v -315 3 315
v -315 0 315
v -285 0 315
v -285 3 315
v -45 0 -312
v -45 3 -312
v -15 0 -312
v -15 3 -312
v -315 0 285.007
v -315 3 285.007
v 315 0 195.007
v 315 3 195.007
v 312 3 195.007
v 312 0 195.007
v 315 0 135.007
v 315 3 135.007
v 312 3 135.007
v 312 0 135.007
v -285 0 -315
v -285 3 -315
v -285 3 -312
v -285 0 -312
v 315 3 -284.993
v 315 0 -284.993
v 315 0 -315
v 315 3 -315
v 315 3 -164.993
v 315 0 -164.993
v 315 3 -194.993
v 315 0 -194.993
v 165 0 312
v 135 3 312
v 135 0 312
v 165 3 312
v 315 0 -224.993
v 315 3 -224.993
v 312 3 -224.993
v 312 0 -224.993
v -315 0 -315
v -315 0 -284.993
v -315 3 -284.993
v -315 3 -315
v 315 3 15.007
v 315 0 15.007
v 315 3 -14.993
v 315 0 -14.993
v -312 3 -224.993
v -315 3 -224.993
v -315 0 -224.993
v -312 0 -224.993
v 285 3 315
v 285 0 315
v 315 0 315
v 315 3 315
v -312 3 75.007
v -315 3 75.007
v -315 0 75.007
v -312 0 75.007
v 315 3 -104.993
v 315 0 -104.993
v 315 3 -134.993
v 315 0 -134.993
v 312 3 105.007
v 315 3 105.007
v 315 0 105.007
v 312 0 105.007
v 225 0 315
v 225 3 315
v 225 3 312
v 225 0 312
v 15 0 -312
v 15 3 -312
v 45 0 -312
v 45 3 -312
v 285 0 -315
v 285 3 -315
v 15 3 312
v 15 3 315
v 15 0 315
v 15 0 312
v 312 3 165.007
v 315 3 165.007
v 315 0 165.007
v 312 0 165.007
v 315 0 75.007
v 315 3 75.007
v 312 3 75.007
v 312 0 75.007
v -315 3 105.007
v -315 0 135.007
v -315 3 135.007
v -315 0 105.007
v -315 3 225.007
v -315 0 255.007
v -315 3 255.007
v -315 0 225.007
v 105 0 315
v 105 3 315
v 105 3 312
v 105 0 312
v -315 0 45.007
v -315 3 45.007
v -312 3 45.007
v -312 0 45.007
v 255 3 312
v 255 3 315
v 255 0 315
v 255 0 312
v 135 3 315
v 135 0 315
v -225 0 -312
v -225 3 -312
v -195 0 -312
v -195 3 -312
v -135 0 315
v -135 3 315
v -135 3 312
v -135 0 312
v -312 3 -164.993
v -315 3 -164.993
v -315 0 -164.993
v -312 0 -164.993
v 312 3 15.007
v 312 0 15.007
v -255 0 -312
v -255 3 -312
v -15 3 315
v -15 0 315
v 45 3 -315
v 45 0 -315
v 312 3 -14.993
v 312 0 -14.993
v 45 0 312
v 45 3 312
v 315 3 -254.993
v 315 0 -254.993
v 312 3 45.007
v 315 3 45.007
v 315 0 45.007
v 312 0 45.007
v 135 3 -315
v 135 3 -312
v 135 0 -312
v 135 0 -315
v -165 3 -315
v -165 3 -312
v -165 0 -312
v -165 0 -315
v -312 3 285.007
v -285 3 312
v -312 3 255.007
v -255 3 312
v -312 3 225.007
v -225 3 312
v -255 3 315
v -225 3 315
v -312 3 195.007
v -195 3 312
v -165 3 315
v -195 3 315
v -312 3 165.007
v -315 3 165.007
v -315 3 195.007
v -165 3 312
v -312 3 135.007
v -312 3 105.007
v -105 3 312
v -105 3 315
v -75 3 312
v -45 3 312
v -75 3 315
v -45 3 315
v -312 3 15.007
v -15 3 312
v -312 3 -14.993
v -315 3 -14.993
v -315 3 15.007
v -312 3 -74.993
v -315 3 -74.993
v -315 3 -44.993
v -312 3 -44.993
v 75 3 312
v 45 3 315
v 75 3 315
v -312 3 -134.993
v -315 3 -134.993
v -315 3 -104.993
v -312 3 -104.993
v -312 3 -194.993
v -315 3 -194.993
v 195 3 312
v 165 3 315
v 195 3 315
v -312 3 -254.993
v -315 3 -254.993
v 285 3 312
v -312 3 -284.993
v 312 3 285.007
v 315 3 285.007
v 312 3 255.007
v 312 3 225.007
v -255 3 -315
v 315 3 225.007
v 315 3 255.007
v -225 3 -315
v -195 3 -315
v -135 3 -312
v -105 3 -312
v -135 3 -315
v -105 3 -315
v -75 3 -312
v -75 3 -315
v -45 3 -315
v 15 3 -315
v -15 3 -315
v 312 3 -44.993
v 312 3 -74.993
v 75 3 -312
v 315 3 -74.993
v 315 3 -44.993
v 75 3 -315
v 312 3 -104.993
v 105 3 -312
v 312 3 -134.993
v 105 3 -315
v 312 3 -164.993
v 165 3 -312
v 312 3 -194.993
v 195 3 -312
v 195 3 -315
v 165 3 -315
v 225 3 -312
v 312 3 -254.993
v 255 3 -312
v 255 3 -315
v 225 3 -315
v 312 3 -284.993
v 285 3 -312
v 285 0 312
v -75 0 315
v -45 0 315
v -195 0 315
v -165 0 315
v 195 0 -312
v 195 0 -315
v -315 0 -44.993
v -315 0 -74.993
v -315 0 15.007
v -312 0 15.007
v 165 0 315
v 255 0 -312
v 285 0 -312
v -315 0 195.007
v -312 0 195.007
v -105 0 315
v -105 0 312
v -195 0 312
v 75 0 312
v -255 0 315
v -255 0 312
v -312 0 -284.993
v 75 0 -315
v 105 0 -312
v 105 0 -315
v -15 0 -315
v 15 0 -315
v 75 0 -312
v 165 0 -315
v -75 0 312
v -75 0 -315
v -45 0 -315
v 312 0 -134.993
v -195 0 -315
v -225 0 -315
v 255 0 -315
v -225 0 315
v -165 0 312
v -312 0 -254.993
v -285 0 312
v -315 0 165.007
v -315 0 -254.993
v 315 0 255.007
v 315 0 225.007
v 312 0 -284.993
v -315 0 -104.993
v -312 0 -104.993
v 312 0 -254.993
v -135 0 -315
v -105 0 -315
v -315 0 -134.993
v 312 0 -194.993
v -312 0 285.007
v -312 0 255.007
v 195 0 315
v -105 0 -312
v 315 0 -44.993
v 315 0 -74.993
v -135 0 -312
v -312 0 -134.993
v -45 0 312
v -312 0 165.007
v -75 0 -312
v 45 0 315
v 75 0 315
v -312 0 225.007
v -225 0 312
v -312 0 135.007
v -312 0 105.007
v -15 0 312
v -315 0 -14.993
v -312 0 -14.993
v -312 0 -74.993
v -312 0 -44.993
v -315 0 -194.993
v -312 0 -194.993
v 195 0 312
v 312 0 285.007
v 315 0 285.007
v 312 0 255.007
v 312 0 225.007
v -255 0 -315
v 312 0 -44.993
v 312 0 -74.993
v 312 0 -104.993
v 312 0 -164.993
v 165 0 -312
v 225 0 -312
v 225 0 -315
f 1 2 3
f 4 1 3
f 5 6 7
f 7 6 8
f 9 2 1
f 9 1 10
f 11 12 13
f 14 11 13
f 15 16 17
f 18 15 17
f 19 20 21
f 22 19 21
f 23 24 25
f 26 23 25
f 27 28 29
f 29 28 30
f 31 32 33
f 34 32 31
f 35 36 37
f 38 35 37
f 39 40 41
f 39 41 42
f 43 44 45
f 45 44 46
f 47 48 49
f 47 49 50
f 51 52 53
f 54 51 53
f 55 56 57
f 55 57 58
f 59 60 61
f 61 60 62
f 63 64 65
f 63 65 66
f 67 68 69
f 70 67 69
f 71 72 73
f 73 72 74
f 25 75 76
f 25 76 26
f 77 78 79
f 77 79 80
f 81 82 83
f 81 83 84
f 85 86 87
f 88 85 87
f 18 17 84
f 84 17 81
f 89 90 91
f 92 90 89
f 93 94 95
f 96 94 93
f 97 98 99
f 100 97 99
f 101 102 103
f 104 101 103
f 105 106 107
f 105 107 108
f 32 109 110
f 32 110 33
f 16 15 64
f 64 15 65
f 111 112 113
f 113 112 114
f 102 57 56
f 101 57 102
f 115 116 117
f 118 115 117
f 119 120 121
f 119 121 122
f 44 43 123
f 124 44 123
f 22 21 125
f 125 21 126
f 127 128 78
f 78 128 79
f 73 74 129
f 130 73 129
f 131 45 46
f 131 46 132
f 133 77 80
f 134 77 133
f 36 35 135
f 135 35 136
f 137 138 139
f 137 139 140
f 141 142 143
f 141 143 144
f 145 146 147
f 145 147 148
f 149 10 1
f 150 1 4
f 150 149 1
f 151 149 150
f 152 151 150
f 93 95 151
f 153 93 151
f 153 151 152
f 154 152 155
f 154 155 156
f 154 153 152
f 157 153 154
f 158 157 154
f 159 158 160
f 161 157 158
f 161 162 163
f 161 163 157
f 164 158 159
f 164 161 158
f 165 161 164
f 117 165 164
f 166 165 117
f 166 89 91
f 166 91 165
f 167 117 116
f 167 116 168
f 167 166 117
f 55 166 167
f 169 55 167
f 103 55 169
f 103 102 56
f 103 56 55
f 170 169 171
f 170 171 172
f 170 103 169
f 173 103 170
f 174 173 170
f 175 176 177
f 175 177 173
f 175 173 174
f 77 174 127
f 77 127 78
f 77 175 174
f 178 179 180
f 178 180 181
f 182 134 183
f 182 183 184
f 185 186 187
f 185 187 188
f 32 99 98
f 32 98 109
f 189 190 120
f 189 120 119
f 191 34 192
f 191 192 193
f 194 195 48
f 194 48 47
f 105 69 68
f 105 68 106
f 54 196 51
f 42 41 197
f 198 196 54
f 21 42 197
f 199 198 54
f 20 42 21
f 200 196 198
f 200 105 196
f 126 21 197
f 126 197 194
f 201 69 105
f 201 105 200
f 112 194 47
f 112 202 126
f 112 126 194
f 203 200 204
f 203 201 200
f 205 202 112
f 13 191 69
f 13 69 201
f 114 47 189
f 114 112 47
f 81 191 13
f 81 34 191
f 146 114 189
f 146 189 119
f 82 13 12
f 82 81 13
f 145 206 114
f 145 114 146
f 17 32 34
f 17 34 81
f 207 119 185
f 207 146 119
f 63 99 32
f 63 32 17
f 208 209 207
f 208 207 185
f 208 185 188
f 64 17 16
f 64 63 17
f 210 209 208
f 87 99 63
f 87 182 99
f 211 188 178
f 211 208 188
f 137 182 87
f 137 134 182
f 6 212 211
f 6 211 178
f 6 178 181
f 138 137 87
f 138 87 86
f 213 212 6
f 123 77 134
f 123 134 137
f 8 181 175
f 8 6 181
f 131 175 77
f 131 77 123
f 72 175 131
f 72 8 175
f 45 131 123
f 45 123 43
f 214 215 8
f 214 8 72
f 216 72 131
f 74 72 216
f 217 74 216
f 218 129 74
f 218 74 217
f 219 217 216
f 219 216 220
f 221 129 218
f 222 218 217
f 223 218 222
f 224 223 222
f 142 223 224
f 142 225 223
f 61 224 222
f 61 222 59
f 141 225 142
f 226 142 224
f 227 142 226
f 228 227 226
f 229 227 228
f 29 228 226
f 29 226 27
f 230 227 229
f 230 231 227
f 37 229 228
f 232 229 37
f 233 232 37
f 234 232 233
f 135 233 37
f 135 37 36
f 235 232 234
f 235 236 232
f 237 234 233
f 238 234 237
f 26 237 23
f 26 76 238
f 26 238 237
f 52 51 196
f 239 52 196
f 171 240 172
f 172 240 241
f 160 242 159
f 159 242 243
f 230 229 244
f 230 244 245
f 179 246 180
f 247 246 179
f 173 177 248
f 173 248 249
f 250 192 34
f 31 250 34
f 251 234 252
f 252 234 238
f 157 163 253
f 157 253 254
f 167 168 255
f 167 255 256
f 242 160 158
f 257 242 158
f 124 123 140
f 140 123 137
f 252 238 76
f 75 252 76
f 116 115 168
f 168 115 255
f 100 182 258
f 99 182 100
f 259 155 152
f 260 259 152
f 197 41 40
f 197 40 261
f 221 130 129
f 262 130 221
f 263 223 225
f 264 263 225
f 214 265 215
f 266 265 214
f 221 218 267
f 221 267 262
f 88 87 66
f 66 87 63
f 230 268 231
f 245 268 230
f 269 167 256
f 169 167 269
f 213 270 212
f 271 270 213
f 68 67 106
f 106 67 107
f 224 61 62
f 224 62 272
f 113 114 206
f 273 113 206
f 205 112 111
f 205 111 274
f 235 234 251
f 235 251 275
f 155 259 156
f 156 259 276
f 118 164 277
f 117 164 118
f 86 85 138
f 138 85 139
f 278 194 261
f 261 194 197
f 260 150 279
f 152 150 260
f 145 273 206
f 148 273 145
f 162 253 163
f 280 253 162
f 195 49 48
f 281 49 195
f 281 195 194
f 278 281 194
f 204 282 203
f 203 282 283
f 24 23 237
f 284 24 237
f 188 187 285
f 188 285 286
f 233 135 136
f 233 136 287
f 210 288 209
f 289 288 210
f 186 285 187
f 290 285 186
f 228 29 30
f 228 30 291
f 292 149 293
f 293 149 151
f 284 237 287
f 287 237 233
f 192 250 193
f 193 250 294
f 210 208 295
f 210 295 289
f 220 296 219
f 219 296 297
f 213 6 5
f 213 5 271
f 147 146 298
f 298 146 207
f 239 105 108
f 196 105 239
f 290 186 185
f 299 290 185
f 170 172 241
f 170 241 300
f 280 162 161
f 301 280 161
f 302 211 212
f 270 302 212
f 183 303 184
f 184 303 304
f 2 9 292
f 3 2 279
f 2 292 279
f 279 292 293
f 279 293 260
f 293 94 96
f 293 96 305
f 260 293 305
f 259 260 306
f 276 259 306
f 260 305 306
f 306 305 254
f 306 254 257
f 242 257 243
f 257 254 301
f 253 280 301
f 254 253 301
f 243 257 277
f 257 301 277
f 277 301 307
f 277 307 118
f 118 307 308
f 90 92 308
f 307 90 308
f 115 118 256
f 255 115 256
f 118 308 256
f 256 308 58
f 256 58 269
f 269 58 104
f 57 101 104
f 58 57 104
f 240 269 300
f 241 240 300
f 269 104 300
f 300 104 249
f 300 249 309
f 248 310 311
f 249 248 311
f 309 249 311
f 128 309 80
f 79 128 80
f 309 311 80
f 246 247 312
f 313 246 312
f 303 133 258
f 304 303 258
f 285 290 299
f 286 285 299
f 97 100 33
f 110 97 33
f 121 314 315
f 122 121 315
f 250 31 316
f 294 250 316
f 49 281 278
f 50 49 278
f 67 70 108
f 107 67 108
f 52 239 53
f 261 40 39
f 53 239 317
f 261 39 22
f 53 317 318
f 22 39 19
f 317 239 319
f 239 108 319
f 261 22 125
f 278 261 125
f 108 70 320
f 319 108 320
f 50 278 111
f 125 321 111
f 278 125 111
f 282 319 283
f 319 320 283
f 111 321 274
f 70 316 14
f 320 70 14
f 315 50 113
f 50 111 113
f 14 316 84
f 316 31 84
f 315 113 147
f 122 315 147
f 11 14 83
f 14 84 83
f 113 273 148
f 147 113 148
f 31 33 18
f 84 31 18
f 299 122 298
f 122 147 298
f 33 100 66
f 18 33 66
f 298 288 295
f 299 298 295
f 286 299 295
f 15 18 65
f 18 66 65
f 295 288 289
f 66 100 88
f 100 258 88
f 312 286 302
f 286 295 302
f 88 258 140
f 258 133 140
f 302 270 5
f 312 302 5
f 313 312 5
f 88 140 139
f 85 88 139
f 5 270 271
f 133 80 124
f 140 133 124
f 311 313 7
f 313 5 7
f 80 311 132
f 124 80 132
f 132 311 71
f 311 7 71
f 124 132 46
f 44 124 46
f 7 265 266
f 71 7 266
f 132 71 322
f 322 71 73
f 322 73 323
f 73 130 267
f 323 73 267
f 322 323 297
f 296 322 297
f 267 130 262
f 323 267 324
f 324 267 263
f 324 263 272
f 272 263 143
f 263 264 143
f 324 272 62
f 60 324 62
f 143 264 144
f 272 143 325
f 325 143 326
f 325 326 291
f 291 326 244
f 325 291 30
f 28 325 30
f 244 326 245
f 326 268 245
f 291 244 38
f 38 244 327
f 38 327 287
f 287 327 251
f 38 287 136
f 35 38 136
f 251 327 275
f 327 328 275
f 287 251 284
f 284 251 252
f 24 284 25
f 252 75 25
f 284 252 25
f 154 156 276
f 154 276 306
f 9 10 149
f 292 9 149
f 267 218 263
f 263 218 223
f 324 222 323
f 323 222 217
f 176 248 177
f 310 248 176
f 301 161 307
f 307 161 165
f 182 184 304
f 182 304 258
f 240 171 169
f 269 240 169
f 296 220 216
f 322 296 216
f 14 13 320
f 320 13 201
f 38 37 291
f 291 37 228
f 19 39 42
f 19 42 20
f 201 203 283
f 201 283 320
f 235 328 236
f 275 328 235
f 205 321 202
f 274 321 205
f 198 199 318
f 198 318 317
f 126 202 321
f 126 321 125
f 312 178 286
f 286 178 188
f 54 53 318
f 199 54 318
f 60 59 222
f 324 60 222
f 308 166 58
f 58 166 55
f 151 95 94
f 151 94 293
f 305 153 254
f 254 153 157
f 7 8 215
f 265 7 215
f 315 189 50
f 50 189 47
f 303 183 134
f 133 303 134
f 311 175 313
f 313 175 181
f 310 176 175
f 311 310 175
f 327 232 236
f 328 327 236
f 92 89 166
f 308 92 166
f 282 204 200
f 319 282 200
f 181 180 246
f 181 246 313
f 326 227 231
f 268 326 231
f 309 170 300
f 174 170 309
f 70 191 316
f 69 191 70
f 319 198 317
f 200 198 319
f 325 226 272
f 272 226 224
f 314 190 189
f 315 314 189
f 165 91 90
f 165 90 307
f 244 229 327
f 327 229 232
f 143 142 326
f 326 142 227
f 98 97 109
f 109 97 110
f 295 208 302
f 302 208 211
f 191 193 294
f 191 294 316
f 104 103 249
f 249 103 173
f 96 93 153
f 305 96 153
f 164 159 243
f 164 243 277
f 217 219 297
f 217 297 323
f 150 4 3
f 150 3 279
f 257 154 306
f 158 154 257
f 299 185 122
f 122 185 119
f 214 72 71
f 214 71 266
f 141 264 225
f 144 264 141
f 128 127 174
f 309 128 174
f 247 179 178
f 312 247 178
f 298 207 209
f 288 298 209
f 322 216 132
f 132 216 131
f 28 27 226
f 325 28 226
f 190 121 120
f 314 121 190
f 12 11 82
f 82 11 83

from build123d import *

# Parameters (mm, degrees)
SKETCH1_W               = 630
SKETCH1_H               = 630
BOSS_EXTRUDE1_DEPTH     = 3
SKETCH3_W               = 3
SKETCH3_H               = 30
CUT_EXTRUDE2_DEPTH      = 3
LPATTERN2_COUNT         = 10
LPATTERN2_PITCH         = 60
MIRROR1_COPY_1_SKETCH_W = 3
MIRROR1_COPY_1_SKETCH_H = 30
MIRROR1_COPY_1_DEPTH    = 3
MIRROR1_COPY_2_SKETCH_W = 3
MIRROR1_COPY_2_SKETCH_H = 30
MIRROR1_COPY_2_DEPTH    = 3
MIRROR1_COPY_3_SKETCH_W = 3
MIRROR1_COPY_3_SKETCH_H = 30
MIRROR1_COPY_3_DEPTH    = 3
MIRROR1_COPY_4_SKETCH_W = 3
MIRROR1_COPY_4_SKETCH_H = 30
MIRROR1_COPY_4_DEPTH    = 3
MIRROR1_COPY_5_SKETCH_W = 3
MIRROR1_COPY_5_SKETCH_H = 30
MIRROR1_COPY_5_DEPTH    = 3
MIRROR1_COPY_6_SKETCH_W = 3
MIRROR1_COPY_6_SKETCH_H = 30
MIRROR1_COPY_6_DEPTH    = 3
MIRROR1_COPY_7_SKETCH_W = 3
MIRROR1_COPY_7_SKETCH_H = 30
MIRROR1_COPY_7_DEPTH    = 3
MIRROR1_COPY_8_SKETCH_W = 3
MIRROR1_COPY_8_SKETCH_H = 30
MIRROR1_COPY_8_DEPTH    = 3
MIRROR1_COPY_9_SKETCH_W = 3
MIRROR1_COPY_9_SKETCH_H = 30
MIRROR1_COPY_9_DEPTH    = 3
SKETCH5_W               = 30
SKETCH5_H               = 3
CUT_EXTRUDE3_DEPTH      = 3
LPATTERN3_COUNT         = 10
LPATTERN3_PITCH         = 60
MIRROR2_COPY_1_SKETCH_W = 30
MIRROR2_COPY_1_SKETCH_H = 3
MIRROR2_COPY_1_DEPTH    = 3
MIRROR2_COPY_2_SKETCH_W = 30
MIRROR2_COPY_2_SKETCH_H = 3
MIRROR2_COPY_2_DEPTH    = 3
MIRROR2_COPY_3_SKETCH_W = 30
MIRROR2_COPY_3_SKETCH_H = 3
MIRROR2_COPY_3_DEPTH    = 3
MIRROR2_COPY_4_SKETCH_W = 30
MIRROR2_COPY_4_SKETCH_H = 3
MIRROR2_COPY_4_DEPTH    = 3
MIRROR2_COPY_5_SKETCH_W = 30
MIRROR2_COPY_5_SKETCH_H = 3
MIRROR2_COPY_5_DEPTH    = 3
MIRROR2_COPY_6_SKETCH_W = 30
MIRROR2_COPY_6_SKETCH_H = 3
MIRROR2_COPY_6_DEPTH    = 3
MIRROR2_COPY_7_SKETCH_W = 30
MIRROR2_COPY_7_SKETCH_H = 3
MIRROR2_COPY_7_DEPTH    = 3
MIRROR2_COPY_8_SKETCH_W = 30
MIRROR2_COPY_8_SKETCH_H = 3
MIRROR2_COPY_8_DEPTH    = 3
MIRROR2_COPY_9_SKETCH_W = 30
MIRROR2_COPY_9_SKETCH_H = 3
MIRROR2_COPY_9_DEPTH    = 3


with BuildPart() as part:
    # Sketch1 → Boss-Extrude1 (new body)
    with BuildSketch(Plane(origin=(0, 0, 0), x_dir=(1, 0, 0), z_dir=(0, 1, 0))):
        Rectangle(SKETCH1_W, SKETCH1_H)
    extrude(amount=BOSS_EXTRUDE1_DEPTH)

    # Sketch3 → Cut-Extrude2 (cut)
    with BuildSketch(Plane(origin=(0, 3, 0), x_dir=(1, 0, 0), z_dir=(0, 1, 0))):
        with Locations((-313.5, -270.006843512)):
            Rectangle(SKETCH3_W, SKETCH3_H)
    cut_extrude2 = extrude(amount=-CUT_EXTRUDE2_DEPTH, mode=Mode.SUBTRACT)

    # LPattern2: Cut-Extrude2 ×10
    with Locations(*[(0, 0, -i * LPATTERN2_PITCH) for i in range(1, LPATTERN2_COUNT)]):
        add(cut_extrude2, mode=Mode.SUBTRACT)

    # Mirror1: Cut-Extrude2 across plane
    add(cut_extrude2.mirror(Plane(origin=(0, 0, 0), x_dir=(0, 0, 1), z_dir=(1, 0, 0))), mode=Mode.SUBTRACT)

    # Mirror1 copy 1 sketch → Mirror1 copy 1 (cut)
    with BuildSketch(Plane(origin=(0, 3, -60), x_dir=(-1, 0, 0), z_dir=(0, 1, 0))):
        with Locations((-313.5, 270.006843512)):
            Rectangle(MIRROR1_COPY_1_SKETCH_W, MIRROR1_COPY_1_SKETCH_H)
    extrude(amount=-MIRROR1_COPY_1_DEPTH, mode=Mode.SUBTRACT)

    # Mirror1 copy 2 sketch → Mirror1 copy 2 (cut)
    with BuildSketch(Plane(origin=(0, 3, -120), x_dir=(-1, 0, 0), z_dir=(0, 1, 0))):
        with Locations((-313.5, 270.006843512)):
            Rectangle(MIRROR1_COPY_2_SKETCH_W, MIRROR1_COPY_2_SKETCH_H)
    extrude(amount=-MIRROR1_COPY_2_DEPTH, mode=Mode.SUBTRACT)

    # Mirror1 copy 3 sketch → Mirror1 copy 3 (cut)
    with BuildSketch(Plane(origin=(0, 3, -180), x_dir=(-1, 0, 0), z_dir=(0, 1, 0))):
        with Locations((-313.5, 270.006843512)):
            Rectangle(MIRROR1_COPY_3_SKETCH_W, MIRROR1_COPY_3_SKETCH_H)
    extrude(amount=-MIRROR1_COPY_3_DEPTH, mode=Mode.SUBTRACT)

    # Mirror1 copy 4 sketch → Mirror1 copy 4 (cut)
    with BuildSketch(Plane(origin=(0, 3, -240), x_dir=(-1, 0, 0), z_dir=(0, 1, 0))):
        with Locations((-313.5, 270.006843512)):
            Rectangle(MIRROR1_COPY_4_SKETCH_W, MIRROR1_COPY_4_SKETCH_H)
    extrude(amount=-MIRROR1_COPY_4_DEPTH, mode=Mode.SUBTRACT)

    # Mirror1 copy 5 sketch → Mirror1 copy 5 (cut)
    with BuildSketch(Plane(origin=(0, 3, -300), x_dir=(-1, 0, 0), z_dir=(0, 1, 0))):
        with Locations((-313.5, 270.006843512)):
            Rectangle(MIRROR1_COPY_5_SKETCH_W, MIRROR1_COPY_5_SKETCH_H)
    extrude(amount=-MIRROR1_COPY_5_DEPTH, mode=Mode.SUBTRACT)

    # Mirror1 copy 6 sketch → Mirror1 copy 6 (cut)
    with BuildSketch(Plane(origin=(0, 3, -360), x_dir=(-1, 0, 0), z_dir=(0, 1, 0))):
        with Locations((-313.5, 270.006843512)):
            Rectangle(MIRROR1_COPY_6_SKETCH_W, MIRROR1_COPY_6_SKETCH_H)
    extrude(amount=-MIRROR1_COPY_6_DEPTH, mode=Mode.SUBTRACT)

    # Mirror1 copy 7 sketch → Mirror1 copy 7 (cut)
    with BuildSketch(Plane(origin=(0, 3, -420), x_dir=(-1, 0, 0), z_dir=(0, 1, 0))):
        with Locations((-313.5, 270.006843512)):
            Rectangle(MIRROR1_COPY_7_SKETCH_W, MIRROR1_COPY_7_SKETCH_H)
    extrude(amount=-MIRROR1_COPY_7_DEPTH, mode=Mode.SUBTRACT)

    # Mirror1 copy 8 sketch → Mirror1 copy 8 (cut)
    with BuildSketch(Plane(origin=(0, 3, -480), x_dir=(-1, 0, 0), z_dir=(0, 1, 0))):
        with Locations((-313.5, 270.006843512)):
            Rectangle(MIRROR1_COPY_8_SKETCH_W, MIRROR1_COPY_8_SKETCH_H)
    extrude(amount=-MIRROR1_COPY_8_DEPTH, mode=Mode.SUBTRACT)

    # Mirror1 copy 9 sketch → Mirror1 copy 9 (cut)
    with BuildSketch(Plane(origin=(0, 3, -540), x_dir=(-1, 0, 0), z_dir=(0, 1, 0))):
        with Locations((-313.5, 270.006843512)):
            Rectangle(MIRROR1_COPY_9_SKETCH_W, MIRROR1_COPY_9_SKETCH_H)
    extrude(amount=-MIRROR1_COPY_9_DEPTH, mode=Mode.SUBTRACT)

    # Sketch5 → Cut-Extrude3 (cut)
    with BuildSketch(Plane(origin=(0, 3, 0), x_dir=(1, 0, 0), z_dir=(0, 1, 0))):
        with Locations((-270.000314512, -313.5)):
            Rectangle(SKETCH5_W, SKETCH5_H)
    cut_extrude3 = extrude(amount=-CUT_EXTRUDE3_DEPTH, mode=Mode.SUBTRACT)

    # LPattern3: Cut-Extrude3 ×10
    with Locations(*[(i * LPATTERN3_PITCH, 0, 0) for i in range(1, LPATTERN3_COUNT)]):
        add(cut_extrude3, mode=Mode.SUBTRACT)

    # Mirror2: Cut-Extrude3 across plane
    add(cut_extrude3.mirror(Plane.XY), mode=Mode.SUBTRACT)

    # Mirror2 copy 1 sketch → Mirror2 copy 1 (cut)
    with BuildSketch(Plane(origin=(60, 3, 0), x_dir=(1, 0, 0), z_dir=(0, 1, 0))):
        with Locations((-270.000314512, 313.5)):
            Rectangle(MIRROR2_COPY_1_SKETCH_W, MIRROR2_COPY_1_SKETCH_H)
    extrude(amount=-MIRROR2_COPY_1_DEPTH, mode=Mode.SUBTRACT)

    # Mirror2 copy 2 sketch → Mirror2 copy 2 (cut)
    with BuildSketch(Plane(origin=(120, 3, 0), x_dir=(1, 0, 0), z_dir=(0, 1, 0))):
        with Locations((-270.000314512, 313.5)):
            Rectangle(MIRROR2_COPY_2_SKETCH_W, MIRROR2_COPY_2_SKETCH_H)
    extrude(amount=-MIRROR2_COPY_2_DEPTH, mode=Mode.SUBTRACT)

    # Mirror2 copy 3 sketch → Mirror2 copy 3 (cut)
    with BuildSketch(Plane(origin=(180, 3, 0), x_dir=(1, 0, 0), z_dir=(0, 1, 0))):
        with Locations((-270.000314512, 313.5)):
            Rectangle(MIRROR2_COPY_3_SKETCH_W, MIRROR2_COPY_3_SKETCH_H)
    extrude(amount=-MIRROR2_COPY_3_DEPTH, mode=Mode.SUBTRACT)

    # Mirror2 copy 4 sketch → Mirror2 copy 4 (cut)
    with BuildSketch(Plane(origin=(240, 3, 0), x_dir=(1, 0, 0), z_dir=(0, 1, 0))):
        with Locations((-270.000314512, 313.5)):
            Rectangle(MIRROR2_COPY_4_SKETCH_W, MIRROR2_COPY_4_SKETCH_H)
    extrude(amount=-MIRROR2_COPY_4_DEPTH, mode=Mode.SUBTRACT)

    # Mirror2 copy 5 sketch → Mirror2 copy 5 (cut)
    with BuildSketch(Plane(origin=(300, 3, 0), x_dir=(1, 0, 0), z_dir=(0, 1, 0))):
        with Locations((-270.000314512, 313.5)):
            Rectangle(MIRROR2_COPY_5_SKETCH_W, MIRROR2_COPY_5_SKETCH_H)
    extrude(amount=-MIRROR2_COPY_5_DEPTH, mode=Mode.SUBTRACT)

    # Mirror2 copy 6 sketch → Mirror2 copy 6 (cut)
    with BuildSketch(Plane(origin=(360, 3, 0), x_dir=(1, 0, 0), z_dir=(0, 1, 0))):
        with Locations((-270.000314512, 313.5)):
            Rectangle(MIRROR2_COPY_6_SKETCH_W, MIRROR2_COPY_6_SKETCH_H)
    extrude(amount=-MIRROR2_COPY_6_DEPTH, mode=Mode.SUBTRACT)

    # Mirror2 copy 7 sketch → Mirror2 copy 7 (cut)
    with BuildSketch(Plane(origin=(420, 3, 0), x_dir=(1, 0, 0), z_dir=(0, 1, 0))):
        with Locations((-270.000314512, 313.5)):
            Rectangle(MIRROR2_COPY_7_SKETCH_W, MIRROR2_COPY_7_SKETCH_H)
    extrude(amount=-MIRROR2_COPY_7_DEPTH, mode=Mode.SUBTRACT)

    # Mirror2 copy 8 sketch → Mirror2 copy 8 (cut)
    with BuildSketch(Plane(origin=(480, 3, 0), x_dir=(1, 0, 0), z_dir=(0, 1, 0))):
        with Locations((-270.000314512, 313.5)):
            Rectangle(MIRROR2_COPY_8_SKETCH_W, MIRROR2_COPY_8_SKETCH_H)
    extrude(amount=-MIRROR2_COPY_8_DEPTH, mode=Mode.SUBTRACT)

    # Mirror2 copy 9 sketch → Mirror2 copy 9 (cut)
    with BuildSketch(Plane(origin=(540, 3, 0), x_dir=(1, 0, 0), z_dir=(0, 1, 0))):
        with Locations((-270.000314512, 313.5)):
            Rectangle(MIRROR2_COPY_9_SKETCH_W, MIRROR2_COPY_9_SKETCH_H)
    extrude(amount=-MIRROR2_COPY_9_DEPTH, mode=Mode.SUBTRACT)


solid = part.part
